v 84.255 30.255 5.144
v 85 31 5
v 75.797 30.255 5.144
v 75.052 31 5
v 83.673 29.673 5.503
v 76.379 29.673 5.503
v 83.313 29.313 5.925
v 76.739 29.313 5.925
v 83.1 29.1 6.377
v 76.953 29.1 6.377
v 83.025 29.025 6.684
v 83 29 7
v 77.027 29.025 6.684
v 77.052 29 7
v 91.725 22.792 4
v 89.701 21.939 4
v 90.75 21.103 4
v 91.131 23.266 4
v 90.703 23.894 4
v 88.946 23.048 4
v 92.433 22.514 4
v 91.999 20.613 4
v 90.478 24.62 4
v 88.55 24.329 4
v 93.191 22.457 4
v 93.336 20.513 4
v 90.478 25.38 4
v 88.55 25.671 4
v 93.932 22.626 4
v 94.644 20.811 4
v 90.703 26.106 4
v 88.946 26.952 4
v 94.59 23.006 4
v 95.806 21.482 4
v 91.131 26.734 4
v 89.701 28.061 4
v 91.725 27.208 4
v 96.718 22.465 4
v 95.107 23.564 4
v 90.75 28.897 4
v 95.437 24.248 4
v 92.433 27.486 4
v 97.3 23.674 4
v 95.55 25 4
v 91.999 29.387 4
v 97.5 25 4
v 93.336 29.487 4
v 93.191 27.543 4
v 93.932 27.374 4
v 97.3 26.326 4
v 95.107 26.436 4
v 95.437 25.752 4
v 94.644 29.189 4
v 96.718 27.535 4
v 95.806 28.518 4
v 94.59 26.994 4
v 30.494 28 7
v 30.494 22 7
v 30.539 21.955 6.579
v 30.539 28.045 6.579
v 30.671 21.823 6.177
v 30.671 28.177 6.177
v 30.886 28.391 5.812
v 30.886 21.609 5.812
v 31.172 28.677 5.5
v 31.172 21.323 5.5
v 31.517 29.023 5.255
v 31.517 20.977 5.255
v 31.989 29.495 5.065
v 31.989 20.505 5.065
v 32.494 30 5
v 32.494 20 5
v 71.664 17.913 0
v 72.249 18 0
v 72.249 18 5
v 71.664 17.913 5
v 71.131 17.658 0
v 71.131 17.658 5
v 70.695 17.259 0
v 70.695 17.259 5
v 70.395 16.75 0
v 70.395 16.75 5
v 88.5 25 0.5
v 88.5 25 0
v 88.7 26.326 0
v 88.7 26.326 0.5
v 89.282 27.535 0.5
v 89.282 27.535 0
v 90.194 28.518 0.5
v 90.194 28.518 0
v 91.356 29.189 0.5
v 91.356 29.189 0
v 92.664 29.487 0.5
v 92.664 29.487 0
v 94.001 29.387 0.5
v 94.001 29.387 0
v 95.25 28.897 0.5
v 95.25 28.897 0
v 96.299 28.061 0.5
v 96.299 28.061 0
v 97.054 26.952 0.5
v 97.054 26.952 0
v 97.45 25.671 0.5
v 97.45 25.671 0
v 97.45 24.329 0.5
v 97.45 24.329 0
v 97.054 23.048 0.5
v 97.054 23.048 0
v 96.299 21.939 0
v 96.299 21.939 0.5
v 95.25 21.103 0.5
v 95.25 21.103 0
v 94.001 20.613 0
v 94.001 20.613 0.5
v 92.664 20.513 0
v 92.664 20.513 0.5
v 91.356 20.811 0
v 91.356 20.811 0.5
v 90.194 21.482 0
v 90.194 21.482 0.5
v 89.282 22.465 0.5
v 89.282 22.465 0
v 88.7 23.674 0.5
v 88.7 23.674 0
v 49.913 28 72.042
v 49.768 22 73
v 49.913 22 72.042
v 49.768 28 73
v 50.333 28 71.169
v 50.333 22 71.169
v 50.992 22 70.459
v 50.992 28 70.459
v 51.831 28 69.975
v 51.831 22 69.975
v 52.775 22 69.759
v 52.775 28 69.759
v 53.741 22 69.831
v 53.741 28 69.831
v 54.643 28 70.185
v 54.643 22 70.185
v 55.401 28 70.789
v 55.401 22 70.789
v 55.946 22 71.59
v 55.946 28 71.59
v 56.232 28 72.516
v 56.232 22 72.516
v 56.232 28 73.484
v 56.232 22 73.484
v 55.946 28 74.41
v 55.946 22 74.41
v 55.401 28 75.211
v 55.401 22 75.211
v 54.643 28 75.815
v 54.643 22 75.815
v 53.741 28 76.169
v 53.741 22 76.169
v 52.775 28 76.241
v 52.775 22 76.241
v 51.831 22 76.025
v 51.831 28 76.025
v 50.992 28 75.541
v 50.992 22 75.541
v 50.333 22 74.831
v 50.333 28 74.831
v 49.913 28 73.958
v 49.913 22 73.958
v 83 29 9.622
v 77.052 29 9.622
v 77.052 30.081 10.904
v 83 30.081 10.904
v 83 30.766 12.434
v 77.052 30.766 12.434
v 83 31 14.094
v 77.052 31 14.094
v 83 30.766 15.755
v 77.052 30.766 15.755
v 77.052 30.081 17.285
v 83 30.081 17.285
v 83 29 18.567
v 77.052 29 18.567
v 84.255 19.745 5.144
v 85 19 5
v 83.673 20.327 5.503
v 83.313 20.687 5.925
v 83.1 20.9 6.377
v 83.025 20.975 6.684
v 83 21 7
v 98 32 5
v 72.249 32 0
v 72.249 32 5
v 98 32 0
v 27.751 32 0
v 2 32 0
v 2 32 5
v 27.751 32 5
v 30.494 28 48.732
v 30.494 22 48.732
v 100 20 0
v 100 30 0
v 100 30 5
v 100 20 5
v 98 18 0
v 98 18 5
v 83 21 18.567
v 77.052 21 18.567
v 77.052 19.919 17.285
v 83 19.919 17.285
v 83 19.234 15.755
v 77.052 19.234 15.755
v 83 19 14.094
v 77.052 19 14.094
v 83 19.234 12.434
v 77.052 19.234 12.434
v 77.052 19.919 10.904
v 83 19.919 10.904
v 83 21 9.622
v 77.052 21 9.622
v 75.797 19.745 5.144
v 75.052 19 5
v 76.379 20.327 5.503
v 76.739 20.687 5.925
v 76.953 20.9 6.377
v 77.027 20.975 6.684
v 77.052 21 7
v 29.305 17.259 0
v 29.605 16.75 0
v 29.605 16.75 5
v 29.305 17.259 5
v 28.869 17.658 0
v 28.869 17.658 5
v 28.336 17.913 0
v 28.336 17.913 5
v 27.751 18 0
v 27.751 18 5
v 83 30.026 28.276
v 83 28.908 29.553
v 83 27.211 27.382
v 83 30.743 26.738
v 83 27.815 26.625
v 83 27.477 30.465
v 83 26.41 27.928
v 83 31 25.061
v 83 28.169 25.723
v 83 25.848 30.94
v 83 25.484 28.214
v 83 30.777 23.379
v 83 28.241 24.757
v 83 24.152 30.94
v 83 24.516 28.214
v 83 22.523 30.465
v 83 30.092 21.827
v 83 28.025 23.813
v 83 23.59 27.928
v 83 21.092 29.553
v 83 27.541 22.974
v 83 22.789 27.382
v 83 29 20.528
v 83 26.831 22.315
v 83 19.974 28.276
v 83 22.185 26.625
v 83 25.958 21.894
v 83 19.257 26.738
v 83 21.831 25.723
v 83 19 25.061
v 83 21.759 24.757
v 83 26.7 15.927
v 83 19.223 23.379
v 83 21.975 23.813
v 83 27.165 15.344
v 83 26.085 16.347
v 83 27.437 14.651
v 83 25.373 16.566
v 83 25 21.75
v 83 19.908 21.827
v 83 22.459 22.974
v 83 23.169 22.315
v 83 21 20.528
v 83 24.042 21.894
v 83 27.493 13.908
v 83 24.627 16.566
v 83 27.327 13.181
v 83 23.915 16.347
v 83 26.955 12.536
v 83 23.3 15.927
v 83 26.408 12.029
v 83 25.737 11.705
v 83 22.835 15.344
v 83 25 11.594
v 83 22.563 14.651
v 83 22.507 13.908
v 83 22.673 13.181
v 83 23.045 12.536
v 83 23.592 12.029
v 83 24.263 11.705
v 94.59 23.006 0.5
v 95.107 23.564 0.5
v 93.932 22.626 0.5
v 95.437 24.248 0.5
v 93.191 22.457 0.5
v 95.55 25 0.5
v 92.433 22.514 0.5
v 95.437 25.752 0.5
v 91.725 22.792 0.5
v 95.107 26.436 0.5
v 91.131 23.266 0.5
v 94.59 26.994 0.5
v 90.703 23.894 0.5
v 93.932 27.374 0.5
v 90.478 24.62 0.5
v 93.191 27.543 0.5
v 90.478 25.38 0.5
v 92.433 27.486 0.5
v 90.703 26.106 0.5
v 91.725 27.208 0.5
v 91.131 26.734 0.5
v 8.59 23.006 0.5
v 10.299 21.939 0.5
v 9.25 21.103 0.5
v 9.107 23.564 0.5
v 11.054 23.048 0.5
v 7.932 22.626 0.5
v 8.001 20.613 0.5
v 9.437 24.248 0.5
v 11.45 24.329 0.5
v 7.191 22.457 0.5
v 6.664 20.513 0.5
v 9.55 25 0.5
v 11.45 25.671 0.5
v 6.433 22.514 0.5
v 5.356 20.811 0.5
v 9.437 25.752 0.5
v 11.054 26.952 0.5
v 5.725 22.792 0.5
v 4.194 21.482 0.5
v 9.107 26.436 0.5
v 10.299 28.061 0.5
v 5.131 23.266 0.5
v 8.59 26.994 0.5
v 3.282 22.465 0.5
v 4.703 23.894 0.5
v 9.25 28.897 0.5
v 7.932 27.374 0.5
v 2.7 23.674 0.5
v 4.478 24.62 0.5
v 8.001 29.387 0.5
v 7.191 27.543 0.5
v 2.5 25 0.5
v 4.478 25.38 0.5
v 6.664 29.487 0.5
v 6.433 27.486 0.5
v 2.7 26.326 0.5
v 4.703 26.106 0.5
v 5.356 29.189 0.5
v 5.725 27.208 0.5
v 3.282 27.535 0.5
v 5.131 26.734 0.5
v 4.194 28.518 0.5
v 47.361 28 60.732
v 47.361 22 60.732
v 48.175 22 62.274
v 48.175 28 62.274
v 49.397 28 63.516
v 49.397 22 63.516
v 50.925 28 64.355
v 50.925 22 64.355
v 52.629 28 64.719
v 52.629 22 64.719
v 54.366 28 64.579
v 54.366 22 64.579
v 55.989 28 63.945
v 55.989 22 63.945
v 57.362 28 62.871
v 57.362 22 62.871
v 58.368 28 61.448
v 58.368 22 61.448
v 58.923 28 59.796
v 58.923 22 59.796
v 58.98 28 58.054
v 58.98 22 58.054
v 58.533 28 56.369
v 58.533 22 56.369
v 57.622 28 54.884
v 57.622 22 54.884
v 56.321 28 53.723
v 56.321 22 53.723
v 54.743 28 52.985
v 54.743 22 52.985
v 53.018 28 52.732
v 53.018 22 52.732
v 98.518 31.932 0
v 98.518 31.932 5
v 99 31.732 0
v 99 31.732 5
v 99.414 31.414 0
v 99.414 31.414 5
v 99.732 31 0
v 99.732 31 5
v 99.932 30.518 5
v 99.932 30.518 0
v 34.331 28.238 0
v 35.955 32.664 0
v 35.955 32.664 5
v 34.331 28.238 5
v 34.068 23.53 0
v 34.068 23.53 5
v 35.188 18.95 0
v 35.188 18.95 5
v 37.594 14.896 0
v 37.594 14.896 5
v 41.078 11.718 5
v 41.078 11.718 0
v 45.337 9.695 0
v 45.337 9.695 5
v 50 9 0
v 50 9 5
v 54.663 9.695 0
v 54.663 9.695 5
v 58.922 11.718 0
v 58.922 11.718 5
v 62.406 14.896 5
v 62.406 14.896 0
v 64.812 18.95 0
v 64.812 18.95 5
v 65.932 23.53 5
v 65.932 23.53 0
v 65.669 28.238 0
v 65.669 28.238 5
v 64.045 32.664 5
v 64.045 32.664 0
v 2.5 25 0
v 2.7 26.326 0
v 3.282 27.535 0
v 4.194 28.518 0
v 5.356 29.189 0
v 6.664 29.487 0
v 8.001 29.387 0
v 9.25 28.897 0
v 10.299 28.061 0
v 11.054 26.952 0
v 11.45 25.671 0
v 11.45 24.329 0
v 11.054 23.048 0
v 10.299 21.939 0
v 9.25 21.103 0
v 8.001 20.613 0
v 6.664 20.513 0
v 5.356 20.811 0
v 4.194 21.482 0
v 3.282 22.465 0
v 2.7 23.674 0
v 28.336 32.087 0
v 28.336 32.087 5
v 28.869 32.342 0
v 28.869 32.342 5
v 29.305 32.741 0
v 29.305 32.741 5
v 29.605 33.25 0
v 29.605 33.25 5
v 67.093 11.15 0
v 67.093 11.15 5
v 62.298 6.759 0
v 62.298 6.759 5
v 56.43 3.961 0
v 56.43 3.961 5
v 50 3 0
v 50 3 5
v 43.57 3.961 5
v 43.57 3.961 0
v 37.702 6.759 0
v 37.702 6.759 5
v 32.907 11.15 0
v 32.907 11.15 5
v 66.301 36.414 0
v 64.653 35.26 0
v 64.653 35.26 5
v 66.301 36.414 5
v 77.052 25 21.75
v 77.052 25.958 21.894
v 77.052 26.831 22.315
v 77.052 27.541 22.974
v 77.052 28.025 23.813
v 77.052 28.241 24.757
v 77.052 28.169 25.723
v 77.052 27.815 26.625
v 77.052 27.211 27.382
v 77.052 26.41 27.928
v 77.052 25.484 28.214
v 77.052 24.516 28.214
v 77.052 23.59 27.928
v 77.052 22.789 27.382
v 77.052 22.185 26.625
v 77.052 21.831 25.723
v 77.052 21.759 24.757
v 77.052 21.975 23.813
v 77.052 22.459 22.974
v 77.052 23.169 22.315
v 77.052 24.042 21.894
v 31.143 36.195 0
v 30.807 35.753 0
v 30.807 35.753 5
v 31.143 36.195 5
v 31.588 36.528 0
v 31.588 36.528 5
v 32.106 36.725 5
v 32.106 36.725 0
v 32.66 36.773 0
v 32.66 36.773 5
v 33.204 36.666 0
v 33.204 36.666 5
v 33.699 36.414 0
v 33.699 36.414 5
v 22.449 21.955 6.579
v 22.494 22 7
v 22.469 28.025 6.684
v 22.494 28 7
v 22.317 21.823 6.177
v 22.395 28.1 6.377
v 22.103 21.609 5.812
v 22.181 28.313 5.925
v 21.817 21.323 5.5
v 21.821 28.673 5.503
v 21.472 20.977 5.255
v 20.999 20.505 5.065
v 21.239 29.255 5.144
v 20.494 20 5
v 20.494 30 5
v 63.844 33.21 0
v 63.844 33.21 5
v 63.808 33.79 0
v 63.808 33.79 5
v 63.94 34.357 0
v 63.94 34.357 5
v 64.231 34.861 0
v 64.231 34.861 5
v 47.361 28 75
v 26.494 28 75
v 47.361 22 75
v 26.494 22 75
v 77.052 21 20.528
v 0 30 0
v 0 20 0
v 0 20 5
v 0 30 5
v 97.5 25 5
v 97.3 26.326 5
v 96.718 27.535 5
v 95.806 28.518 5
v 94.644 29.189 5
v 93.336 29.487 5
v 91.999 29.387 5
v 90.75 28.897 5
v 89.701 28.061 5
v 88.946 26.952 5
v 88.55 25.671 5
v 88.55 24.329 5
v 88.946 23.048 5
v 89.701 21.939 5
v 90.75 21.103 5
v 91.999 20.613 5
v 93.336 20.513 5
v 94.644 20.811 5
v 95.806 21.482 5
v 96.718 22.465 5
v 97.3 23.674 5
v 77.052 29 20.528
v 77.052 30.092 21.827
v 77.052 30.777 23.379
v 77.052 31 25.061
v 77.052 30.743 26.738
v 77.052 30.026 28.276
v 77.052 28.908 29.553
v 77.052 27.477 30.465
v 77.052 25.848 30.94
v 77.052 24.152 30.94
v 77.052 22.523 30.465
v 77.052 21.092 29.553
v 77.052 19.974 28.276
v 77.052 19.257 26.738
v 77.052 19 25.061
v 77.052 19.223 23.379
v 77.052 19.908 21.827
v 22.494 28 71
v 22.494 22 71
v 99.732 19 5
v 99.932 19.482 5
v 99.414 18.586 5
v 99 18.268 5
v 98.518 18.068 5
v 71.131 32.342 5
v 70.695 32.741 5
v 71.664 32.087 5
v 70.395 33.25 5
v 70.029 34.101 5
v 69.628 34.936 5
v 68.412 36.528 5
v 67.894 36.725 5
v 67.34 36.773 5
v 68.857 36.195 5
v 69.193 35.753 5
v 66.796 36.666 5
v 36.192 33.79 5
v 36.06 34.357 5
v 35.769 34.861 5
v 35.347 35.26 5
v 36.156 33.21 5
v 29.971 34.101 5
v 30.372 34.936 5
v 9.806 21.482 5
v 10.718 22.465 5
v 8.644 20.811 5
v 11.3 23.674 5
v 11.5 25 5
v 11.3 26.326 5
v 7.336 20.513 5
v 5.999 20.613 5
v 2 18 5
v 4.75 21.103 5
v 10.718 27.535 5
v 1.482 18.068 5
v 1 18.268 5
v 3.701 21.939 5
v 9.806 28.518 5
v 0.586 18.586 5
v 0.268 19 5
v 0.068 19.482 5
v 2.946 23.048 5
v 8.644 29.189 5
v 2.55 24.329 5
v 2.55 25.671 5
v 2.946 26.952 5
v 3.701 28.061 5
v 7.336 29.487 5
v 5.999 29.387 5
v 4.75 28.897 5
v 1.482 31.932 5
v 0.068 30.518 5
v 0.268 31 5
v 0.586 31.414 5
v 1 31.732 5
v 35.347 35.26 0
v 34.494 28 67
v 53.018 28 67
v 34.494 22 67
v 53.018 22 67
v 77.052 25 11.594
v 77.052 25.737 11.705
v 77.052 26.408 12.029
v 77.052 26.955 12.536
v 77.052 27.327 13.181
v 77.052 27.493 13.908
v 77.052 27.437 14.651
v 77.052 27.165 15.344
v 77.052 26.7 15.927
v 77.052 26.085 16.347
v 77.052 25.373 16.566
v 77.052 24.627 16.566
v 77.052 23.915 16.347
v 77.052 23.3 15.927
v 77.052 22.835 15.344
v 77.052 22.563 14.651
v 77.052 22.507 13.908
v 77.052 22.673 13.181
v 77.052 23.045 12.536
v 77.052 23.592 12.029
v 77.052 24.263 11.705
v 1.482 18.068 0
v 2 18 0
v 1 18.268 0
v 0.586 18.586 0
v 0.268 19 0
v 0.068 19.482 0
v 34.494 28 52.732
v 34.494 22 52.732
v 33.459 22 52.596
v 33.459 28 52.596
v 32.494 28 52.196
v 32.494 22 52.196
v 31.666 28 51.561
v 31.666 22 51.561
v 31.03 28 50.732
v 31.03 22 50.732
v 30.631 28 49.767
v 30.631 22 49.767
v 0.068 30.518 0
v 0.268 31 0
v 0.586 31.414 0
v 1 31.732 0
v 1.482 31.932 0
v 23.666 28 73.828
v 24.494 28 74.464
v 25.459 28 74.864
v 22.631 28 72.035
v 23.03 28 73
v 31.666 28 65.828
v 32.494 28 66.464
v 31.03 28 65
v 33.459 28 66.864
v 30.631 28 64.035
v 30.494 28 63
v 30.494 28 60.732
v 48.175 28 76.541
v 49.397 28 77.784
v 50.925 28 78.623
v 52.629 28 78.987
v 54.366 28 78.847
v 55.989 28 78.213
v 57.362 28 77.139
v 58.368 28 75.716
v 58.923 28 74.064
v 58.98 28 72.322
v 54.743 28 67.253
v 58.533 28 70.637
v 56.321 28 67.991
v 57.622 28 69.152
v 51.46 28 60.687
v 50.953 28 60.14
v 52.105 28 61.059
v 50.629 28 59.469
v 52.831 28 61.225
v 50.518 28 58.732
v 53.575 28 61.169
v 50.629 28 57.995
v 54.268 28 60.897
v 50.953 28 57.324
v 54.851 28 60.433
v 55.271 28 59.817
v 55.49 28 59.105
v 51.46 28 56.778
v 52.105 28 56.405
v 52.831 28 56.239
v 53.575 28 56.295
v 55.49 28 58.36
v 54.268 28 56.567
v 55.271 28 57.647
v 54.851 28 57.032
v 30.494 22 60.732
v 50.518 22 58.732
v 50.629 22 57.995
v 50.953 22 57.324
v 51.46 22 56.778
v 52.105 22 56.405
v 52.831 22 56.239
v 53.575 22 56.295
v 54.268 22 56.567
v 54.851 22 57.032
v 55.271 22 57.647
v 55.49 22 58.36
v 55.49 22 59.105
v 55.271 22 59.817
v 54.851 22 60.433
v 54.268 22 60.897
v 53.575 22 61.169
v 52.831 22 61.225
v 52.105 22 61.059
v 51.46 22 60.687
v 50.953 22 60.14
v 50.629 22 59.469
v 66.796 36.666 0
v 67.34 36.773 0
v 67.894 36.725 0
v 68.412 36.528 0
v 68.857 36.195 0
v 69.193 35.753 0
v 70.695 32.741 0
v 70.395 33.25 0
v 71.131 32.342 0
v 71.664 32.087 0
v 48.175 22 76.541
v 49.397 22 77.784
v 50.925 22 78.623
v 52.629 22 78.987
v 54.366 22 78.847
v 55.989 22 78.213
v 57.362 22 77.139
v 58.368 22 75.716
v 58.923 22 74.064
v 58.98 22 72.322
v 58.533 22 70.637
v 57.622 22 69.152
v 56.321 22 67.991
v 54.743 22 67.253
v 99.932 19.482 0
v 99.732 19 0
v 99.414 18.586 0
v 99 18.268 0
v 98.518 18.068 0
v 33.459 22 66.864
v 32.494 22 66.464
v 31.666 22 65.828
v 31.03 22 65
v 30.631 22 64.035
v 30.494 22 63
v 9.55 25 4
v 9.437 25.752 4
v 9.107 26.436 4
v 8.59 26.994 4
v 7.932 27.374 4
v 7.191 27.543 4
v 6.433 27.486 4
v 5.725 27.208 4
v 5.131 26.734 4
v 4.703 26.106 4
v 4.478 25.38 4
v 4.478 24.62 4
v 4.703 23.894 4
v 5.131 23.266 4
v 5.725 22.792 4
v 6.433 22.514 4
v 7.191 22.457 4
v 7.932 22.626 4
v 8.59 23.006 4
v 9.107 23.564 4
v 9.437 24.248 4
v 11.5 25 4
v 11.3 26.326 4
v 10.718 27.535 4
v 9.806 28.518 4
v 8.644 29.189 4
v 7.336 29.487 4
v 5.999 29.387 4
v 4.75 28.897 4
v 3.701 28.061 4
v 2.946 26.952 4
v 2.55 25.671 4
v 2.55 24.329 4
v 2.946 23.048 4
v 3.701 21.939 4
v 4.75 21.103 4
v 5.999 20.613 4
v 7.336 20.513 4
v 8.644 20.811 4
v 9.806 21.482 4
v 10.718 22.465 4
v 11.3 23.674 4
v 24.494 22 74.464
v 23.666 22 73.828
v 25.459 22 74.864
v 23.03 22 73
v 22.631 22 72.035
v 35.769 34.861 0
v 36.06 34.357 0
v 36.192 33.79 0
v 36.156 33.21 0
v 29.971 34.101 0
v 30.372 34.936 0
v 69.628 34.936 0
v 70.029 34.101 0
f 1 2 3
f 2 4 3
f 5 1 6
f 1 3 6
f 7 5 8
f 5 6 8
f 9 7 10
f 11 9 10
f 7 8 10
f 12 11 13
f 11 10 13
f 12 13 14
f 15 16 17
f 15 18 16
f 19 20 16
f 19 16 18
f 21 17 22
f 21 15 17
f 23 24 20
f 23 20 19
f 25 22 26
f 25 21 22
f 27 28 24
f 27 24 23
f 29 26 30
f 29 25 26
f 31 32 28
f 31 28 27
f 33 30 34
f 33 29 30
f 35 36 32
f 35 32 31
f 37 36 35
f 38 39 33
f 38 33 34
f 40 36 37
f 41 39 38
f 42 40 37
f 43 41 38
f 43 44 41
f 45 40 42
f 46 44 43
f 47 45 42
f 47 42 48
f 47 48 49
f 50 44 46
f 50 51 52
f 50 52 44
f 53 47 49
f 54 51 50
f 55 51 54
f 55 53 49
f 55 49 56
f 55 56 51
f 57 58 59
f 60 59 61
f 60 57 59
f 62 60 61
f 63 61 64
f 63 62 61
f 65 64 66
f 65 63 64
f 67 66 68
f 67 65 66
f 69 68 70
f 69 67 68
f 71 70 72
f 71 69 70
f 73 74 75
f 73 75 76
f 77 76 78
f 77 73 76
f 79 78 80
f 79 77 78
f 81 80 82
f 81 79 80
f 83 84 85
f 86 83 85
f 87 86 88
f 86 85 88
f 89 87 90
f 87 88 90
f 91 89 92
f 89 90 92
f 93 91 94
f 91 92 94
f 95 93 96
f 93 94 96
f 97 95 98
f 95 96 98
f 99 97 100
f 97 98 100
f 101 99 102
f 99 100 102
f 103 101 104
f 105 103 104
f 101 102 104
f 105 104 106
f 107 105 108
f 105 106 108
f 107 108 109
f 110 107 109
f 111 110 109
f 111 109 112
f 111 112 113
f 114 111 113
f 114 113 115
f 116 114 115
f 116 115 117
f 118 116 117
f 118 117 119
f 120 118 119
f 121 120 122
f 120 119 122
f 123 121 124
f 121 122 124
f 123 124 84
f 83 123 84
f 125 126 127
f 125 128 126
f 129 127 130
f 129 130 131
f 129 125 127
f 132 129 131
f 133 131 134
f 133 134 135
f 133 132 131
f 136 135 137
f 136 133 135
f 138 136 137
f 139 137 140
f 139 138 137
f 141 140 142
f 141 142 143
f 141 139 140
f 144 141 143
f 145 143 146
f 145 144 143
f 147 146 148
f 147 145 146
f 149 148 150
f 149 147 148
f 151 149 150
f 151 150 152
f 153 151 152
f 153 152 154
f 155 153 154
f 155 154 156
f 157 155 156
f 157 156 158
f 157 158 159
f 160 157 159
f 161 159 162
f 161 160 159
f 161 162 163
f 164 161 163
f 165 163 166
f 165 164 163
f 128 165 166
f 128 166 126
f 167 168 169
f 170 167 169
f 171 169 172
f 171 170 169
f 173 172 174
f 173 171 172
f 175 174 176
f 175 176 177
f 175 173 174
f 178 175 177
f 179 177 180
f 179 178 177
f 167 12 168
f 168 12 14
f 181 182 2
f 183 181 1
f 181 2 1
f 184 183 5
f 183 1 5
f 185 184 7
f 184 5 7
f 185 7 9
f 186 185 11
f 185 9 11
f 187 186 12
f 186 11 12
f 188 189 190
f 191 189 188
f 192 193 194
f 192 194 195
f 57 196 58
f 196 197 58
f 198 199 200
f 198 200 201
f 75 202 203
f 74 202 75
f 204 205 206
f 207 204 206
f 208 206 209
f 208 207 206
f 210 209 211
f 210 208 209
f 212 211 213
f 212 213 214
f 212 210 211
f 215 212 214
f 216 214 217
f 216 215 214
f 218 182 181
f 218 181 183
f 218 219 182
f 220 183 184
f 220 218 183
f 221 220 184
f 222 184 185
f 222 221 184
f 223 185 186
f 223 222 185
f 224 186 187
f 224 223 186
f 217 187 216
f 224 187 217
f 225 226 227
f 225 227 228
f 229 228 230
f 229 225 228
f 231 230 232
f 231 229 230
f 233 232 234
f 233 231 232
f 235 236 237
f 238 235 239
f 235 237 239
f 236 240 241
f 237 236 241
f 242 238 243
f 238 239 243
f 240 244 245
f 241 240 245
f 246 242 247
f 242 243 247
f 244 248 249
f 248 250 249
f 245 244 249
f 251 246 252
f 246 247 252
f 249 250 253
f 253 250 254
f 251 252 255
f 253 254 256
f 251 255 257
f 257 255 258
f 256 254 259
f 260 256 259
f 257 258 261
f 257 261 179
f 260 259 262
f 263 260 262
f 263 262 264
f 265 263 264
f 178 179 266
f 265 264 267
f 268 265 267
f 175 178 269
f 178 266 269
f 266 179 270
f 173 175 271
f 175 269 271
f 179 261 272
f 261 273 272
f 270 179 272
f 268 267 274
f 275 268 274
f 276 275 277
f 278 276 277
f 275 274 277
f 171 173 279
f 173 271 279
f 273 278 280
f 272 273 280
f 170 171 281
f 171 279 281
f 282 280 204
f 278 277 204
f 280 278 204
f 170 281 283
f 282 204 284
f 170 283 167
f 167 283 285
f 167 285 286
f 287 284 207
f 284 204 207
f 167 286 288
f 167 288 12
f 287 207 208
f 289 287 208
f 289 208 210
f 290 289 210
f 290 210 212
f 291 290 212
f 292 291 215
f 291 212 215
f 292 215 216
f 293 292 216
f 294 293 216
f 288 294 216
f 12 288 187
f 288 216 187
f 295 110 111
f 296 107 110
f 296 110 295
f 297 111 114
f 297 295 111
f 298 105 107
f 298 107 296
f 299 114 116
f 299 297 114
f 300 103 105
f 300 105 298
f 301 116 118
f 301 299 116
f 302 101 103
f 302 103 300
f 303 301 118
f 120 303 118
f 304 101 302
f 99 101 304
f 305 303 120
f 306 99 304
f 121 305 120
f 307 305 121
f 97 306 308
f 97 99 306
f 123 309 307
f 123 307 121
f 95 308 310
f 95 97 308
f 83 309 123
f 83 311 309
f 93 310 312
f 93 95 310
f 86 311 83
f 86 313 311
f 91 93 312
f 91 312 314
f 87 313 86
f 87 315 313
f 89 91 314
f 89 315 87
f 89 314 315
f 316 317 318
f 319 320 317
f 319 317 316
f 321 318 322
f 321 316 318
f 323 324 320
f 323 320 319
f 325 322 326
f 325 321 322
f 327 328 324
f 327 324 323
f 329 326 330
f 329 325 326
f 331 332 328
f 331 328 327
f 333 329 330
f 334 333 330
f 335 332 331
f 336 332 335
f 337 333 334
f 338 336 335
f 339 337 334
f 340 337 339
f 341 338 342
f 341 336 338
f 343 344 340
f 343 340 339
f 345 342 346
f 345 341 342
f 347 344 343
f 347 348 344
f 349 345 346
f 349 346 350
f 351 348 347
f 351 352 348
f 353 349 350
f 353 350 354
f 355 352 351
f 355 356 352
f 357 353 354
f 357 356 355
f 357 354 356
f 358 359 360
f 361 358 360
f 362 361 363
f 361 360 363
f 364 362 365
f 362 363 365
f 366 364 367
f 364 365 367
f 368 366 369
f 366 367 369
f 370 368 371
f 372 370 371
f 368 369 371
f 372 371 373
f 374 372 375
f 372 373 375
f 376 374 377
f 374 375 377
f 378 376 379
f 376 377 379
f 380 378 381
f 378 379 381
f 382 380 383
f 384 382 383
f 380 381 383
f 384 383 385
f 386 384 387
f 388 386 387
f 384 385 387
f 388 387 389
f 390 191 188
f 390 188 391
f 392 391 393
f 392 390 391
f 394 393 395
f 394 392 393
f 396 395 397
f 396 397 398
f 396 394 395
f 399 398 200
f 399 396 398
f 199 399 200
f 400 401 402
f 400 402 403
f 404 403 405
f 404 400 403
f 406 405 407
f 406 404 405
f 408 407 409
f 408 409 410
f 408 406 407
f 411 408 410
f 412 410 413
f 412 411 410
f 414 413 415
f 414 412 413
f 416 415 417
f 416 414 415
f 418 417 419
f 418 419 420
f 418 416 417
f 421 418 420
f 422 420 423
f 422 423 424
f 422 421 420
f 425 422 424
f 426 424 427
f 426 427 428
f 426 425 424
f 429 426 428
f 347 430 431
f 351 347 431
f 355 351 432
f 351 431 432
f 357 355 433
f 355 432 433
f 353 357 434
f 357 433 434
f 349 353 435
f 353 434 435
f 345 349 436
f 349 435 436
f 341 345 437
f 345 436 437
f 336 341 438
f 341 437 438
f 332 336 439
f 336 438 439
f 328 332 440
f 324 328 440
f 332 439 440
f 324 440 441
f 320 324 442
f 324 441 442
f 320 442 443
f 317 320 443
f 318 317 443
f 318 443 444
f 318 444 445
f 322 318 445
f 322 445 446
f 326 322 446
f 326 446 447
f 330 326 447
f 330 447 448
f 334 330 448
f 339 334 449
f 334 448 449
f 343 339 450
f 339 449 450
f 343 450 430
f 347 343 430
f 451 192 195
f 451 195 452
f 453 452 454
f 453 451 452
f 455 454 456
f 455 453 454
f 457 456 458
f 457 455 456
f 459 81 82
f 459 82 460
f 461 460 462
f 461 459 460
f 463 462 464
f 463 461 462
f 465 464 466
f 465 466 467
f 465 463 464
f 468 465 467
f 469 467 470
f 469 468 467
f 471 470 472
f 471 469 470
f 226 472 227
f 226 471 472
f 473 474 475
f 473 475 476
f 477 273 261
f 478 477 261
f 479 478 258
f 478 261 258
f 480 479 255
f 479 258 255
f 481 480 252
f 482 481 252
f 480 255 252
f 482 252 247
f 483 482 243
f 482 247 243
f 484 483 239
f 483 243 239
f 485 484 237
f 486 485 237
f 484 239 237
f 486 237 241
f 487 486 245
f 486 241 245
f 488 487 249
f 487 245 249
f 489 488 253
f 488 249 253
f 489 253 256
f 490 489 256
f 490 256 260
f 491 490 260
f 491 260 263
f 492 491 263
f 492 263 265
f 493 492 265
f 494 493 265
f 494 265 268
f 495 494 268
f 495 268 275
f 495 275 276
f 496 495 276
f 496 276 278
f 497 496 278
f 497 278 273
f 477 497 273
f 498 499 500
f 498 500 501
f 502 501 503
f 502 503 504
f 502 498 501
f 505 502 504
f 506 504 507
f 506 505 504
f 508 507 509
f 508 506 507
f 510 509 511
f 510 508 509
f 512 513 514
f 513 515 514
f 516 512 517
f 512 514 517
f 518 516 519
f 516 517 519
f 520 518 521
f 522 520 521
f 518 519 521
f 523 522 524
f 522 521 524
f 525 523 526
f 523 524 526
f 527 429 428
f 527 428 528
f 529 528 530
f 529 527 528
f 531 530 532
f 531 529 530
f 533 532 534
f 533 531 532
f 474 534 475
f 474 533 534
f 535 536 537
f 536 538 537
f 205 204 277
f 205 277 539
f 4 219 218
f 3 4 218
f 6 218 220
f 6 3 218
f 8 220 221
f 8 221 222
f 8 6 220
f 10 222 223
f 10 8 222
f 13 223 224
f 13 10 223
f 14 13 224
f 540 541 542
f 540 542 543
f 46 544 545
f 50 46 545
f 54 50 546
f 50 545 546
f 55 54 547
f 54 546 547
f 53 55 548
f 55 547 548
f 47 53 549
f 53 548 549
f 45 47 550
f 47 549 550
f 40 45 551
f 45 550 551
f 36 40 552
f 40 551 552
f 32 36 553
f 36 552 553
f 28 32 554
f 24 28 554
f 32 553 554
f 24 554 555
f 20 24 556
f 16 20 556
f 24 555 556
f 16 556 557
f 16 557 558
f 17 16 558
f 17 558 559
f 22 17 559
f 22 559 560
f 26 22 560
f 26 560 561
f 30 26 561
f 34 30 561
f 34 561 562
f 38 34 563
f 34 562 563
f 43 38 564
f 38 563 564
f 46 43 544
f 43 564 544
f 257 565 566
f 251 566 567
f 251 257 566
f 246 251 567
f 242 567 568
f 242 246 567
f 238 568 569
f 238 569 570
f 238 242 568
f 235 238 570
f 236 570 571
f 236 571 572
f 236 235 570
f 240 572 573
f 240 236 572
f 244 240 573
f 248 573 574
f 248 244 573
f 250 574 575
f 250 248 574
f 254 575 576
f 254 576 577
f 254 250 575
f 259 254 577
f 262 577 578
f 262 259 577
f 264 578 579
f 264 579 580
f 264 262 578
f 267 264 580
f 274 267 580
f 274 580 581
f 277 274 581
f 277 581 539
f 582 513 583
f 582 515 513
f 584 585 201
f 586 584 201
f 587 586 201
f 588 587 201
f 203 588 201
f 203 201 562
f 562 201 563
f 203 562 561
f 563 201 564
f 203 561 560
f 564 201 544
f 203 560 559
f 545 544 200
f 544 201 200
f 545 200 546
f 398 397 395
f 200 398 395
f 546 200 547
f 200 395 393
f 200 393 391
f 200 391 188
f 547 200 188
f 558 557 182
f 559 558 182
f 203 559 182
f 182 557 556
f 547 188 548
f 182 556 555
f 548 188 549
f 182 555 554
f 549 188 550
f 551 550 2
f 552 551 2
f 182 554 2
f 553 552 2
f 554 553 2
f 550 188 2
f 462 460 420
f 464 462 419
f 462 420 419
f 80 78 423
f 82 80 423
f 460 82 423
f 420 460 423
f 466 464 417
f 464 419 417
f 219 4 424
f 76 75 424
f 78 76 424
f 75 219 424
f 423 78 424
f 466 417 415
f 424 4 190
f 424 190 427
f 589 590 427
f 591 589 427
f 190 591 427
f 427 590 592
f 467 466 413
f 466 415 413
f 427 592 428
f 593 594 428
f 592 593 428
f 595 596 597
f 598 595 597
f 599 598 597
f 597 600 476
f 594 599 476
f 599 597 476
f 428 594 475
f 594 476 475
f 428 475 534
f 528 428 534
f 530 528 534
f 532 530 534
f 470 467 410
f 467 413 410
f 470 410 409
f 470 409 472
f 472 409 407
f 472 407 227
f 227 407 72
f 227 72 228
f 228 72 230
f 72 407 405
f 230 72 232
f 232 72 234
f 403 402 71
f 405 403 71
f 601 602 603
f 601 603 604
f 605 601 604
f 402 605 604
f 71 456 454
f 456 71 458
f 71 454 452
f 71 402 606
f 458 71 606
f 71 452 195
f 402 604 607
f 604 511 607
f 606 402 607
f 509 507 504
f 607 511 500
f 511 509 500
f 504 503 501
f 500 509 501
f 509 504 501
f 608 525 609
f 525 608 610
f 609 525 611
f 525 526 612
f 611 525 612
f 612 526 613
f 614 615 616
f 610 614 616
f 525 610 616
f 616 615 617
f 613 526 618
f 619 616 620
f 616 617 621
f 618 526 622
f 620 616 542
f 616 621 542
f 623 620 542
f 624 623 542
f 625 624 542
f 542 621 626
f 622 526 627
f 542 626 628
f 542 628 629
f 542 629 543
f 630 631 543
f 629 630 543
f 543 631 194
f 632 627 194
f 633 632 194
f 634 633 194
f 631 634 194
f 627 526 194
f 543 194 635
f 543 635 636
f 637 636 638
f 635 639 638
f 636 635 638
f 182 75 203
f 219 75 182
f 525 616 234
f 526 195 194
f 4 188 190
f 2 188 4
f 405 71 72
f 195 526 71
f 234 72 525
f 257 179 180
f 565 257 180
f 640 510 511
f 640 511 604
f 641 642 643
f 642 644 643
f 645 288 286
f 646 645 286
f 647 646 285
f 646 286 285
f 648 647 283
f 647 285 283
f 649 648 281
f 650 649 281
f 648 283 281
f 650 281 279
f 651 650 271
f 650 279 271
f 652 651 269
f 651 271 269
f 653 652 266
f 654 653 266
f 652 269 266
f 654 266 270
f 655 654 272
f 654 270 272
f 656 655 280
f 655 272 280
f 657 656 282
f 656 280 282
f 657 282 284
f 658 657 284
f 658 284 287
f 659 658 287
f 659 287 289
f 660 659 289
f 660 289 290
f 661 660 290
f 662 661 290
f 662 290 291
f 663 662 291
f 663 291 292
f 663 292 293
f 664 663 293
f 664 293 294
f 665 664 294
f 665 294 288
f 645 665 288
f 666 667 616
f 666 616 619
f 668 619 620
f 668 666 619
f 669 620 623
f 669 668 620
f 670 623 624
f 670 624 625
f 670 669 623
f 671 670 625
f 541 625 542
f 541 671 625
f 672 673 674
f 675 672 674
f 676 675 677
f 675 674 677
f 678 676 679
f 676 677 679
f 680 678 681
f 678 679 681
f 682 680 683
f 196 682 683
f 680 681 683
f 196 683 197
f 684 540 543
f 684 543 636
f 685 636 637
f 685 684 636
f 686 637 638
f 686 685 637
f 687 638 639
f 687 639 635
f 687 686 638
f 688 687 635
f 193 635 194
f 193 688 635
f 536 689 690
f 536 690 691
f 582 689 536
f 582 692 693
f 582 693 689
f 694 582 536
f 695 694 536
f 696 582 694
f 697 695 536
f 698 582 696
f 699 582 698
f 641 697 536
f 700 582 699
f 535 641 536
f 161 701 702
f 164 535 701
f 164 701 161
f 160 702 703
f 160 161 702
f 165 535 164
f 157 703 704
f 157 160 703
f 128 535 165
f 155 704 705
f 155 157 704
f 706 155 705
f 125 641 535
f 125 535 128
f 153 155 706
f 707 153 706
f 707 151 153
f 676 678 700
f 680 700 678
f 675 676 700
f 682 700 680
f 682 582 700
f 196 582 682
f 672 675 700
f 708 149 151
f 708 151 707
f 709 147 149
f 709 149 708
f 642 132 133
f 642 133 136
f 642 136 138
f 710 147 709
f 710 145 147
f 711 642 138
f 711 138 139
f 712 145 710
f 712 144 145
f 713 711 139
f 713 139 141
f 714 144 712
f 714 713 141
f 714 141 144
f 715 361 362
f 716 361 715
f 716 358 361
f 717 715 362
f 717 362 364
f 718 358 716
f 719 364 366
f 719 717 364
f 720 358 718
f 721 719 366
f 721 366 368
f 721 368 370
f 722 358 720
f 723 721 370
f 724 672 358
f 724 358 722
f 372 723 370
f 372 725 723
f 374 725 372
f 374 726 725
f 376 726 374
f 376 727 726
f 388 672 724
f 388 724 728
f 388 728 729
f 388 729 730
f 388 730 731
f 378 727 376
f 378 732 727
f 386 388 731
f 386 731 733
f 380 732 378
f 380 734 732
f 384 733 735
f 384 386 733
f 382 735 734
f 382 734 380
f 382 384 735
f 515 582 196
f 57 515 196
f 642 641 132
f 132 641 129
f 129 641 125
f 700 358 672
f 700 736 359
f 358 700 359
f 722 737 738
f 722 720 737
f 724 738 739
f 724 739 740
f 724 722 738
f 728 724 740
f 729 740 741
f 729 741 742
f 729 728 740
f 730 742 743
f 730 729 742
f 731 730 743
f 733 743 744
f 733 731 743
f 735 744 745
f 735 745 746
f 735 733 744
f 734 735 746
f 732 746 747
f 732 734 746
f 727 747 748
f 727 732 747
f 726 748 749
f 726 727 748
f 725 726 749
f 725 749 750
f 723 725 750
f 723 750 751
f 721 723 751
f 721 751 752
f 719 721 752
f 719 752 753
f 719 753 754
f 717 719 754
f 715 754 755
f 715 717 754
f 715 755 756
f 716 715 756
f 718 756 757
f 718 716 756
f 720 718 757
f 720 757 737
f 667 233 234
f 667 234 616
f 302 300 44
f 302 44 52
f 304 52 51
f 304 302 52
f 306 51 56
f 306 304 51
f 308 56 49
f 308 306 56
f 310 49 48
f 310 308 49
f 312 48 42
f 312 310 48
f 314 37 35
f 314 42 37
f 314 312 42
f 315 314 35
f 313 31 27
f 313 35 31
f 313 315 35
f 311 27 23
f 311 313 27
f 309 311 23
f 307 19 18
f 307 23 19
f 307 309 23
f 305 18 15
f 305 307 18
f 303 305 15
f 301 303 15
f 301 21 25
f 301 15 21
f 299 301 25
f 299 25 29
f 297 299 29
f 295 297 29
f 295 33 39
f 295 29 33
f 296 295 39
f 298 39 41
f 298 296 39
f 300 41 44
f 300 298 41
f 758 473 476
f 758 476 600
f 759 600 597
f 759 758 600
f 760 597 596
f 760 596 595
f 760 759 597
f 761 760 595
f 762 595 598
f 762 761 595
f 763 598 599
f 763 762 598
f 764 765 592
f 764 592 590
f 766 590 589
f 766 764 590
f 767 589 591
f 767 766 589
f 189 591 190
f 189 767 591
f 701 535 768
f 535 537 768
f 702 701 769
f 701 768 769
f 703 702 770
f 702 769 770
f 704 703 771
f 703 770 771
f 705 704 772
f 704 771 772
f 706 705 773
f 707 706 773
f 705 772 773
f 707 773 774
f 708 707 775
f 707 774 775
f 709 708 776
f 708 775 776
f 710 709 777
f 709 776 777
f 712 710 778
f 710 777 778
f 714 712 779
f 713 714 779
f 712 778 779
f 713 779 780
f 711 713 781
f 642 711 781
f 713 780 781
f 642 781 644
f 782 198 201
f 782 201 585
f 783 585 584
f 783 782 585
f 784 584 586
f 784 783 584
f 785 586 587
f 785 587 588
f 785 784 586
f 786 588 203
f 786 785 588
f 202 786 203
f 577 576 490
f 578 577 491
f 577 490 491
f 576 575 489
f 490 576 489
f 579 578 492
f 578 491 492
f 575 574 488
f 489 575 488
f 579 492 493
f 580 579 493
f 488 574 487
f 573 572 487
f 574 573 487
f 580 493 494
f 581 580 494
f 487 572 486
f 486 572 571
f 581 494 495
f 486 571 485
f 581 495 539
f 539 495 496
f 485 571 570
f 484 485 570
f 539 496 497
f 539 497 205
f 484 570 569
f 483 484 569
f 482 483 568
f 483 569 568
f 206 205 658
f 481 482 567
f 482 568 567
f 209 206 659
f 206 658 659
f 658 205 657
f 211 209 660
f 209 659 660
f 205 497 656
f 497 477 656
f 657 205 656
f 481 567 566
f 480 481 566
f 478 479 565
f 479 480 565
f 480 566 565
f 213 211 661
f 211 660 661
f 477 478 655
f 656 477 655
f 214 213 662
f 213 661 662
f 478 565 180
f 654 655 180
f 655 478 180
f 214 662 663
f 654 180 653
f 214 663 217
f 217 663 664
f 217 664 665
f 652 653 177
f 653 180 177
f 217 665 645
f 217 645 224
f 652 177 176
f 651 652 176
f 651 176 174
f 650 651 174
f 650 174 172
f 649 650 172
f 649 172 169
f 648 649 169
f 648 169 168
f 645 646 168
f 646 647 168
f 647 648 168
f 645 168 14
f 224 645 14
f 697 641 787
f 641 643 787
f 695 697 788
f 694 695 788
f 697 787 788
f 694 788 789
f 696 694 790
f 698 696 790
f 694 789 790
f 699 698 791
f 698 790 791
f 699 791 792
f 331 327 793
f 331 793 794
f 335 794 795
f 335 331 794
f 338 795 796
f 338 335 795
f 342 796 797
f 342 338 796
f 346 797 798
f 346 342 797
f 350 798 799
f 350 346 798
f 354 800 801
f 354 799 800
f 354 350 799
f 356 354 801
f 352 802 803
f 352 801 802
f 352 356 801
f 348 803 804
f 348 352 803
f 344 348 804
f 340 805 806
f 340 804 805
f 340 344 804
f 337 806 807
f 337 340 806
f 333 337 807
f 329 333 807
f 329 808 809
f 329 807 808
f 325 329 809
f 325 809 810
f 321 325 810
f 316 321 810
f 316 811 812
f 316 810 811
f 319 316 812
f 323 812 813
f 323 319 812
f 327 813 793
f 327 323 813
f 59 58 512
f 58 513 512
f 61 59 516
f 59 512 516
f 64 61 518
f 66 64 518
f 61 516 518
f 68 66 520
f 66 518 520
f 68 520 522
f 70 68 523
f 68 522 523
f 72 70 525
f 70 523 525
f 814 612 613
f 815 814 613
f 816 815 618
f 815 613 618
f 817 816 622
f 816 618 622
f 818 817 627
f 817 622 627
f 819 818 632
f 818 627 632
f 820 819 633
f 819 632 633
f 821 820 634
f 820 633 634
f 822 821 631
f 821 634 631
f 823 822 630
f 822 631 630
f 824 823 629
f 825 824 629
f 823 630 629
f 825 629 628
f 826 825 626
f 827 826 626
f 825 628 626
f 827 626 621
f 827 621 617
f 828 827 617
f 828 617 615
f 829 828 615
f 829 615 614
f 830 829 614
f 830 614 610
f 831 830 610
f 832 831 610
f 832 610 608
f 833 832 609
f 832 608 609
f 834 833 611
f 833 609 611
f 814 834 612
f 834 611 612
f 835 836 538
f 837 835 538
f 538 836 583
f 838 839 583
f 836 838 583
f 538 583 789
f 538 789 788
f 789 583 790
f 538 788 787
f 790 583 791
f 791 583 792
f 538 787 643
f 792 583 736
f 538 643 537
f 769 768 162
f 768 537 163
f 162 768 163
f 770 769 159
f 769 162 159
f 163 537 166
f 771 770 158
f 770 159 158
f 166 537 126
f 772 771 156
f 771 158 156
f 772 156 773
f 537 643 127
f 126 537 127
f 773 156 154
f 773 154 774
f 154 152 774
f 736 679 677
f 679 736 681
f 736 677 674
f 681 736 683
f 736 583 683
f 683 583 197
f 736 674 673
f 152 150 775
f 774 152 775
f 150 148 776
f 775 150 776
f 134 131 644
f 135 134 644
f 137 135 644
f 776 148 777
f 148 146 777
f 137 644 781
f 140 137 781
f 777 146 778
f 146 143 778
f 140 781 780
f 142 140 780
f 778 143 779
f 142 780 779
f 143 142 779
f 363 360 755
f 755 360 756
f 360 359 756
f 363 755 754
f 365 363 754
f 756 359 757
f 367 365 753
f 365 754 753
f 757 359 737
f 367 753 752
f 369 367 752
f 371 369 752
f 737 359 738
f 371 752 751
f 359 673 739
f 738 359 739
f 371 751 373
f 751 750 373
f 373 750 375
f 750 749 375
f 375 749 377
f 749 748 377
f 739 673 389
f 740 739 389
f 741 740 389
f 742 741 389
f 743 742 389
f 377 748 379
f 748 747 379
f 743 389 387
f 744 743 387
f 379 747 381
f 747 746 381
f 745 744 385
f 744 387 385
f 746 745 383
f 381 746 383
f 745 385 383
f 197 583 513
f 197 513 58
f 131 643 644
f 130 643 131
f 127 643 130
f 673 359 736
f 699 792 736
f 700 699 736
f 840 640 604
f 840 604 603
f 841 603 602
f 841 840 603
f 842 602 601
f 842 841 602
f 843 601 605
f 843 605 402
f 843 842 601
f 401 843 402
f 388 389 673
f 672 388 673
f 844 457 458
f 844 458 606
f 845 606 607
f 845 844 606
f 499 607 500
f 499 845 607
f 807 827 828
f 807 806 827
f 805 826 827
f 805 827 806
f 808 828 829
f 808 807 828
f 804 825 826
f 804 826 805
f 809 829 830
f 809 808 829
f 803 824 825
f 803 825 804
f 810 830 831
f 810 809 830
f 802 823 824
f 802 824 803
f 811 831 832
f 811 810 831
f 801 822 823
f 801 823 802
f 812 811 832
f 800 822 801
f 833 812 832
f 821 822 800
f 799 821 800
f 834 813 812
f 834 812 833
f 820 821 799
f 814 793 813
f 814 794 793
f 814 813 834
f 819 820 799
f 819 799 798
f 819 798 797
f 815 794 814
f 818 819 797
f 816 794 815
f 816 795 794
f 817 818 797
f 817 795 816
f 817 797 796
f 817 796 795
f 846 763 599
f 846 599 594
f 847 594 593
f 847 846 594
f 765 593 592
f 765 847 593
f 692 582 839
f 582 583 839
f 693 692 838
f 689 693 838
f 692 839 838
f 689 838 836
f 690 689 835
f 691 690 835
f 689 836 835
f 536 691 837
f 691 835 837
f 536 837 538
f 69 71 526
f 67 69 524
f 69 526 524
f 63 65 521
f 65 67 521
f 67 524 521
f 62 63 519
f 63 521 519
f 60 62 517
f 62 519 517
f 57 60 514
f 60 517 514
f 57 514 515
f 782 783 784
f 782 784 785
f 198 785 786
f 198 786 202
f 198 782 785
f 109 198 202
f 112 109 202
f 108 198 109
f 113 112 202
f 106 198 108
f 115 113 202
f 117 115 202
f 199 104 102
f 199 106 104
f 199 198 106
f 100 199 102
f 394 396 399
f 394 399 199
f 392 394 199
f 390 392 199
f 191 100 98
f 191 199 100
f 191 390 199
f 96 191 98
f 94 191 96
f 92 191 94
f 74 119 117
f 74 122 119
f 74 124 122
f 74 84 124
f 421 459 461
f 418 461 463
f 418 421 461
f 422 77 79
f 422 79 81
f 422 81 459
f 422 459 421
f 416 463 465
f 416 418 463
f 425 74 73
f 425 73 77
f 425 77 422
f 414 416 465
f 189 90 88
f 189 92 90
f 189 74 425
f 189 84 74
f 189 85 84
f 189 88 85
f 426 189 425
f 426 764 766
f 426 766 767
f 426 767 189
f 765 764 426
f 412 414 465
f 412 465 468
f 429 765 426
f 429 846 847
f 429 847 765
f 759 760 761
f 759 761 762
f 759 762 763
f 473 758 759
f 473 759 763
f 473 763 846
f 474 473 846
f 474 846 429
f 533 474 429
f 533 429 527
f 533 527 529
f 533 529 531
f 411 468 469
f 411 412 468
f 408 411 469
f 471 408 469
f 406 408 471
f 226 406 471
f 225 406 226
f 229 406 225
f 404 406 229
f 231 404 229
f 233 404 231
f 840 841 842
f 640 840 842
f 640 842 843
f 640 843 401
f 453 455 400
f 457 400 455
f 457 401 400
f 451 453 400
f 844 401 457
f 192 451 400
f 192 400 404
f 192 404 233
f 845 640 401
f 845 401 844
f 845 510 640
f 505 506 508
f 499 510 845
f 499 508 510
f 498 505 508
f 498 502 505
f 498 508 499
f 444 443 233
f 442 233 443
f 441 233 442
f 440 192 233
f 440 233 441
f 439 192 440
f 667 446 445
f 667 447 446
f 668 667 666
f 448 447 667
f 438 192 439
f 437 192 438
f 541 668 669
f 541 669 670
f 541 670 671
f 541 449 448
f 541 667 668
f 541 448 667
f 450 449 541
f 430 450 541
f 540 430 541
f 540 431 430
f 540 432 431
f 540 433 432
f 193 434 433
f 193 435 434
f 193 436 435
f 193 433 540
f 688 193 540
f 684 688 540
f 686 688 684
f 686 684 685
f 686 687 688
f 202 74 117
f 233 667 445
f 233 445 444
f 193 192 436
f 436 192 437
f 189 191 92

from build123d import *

# Parameters (mm, degrees)
SKETCH1_R                = 2.55
BOSS_EXTRUDE1_DEPTH      = 5
SKETCH4_R                = 4.5
CUT_EXTRUDE2_DEPTH       = 1
SKETCH6_W                = 5.947651005
SKETCH6_H                = 20
BOSS_EXTRUDE2_DEPTH      = 4
BOSS_EXTRUDE2_DEPTH_BACK = 4
SKETCH11_R               = 4.5
CUT_EXTRUDE3_DEPTH       = 0.5
SKETCH16_R               = 3.25
SKETCH16_R_2             = 2.5
BOSS_EXTRUDE3_DEPTH      = 3
BOSS_EXTRUDE3_DEPTH_BACK = 3
FILLET3_R                = 2
BOSS_EXTRUDE4_DEPTH      = 5.947651
CUT_EXTRUDE5_REACH       = 85
SKETCH18_R               = 3.25
SKETCH18_R_2             = 2.5


with BuildPart() as part:
    # Sketch1 → Boss-Extrude1 (new body)
    with BuildSketch(Plane.XY):
        with BuildLine():
            Line((100, 25), (100, 20))
            ThreePointArc((100, 20), (99.414213562, 18.585786438), (98, 18))
            Line((98, 18), (72.248595461, 18))
            ThreePointArc((72.248595461, 18), (71.130561473, 17.658312395), (70.39454584, 16.75))
            ThreePointArc((70.39454584, 16.75), (50, 3), (29.60545416, 16.75))
            ThreePointArc((29.60545416, 16.75), (28.869438527, 17.658312395), (27.751404539, 18))
            Line((27.751404539, 18), (2, 18))
            ThreePointArc((2, 18), (0.585786438, 18.585786438), (0, 20))
            Line((0, 20), (0, 25))
            Line((0, 25), (0, 30))
            ThreePointArc((0, 30), (0.585786438, 31.414213562), (2, 32))
            Line((2, 32), (21.056240945, 32))
            Line((21.056240945, 32), (27.751404539, 32))
            ThreePointArc((27.751404539, 32), (28.869438527, 32.341687605), (29.60545416, 33.25))
            ThreePointArc((29.60545416, 33.25), (30.166752838, 34.520625347), (30.807119991, 35.753295167))
            ThreePointArc((30.807119991, 35.753295167), (32.106461975, 36.725482012), (33.699080137, 36.414026968))
            Line((33.699080137, 36.414026968), (35.34656276, 35.260447216))
            ThreePointArc((35.34656276, 35.260447216), (36.146649881, 34.078494315), (35.955031011, 32.664127224))
            ThreePointArc((35.955031011, 32.664127224), (50, 9), (64.044968989, 32.664127224))
            ThreePointArc((64.044968989, 32.664127224), (63.853350119, 34.078494315), (64.65343724, 35.260447216))
            Line((64.65343724, 35.260447216), (66.300919863, 36.414026968))
            ThreePointArc((66.300919863, 36.414026968), (67.893538025, 36.725482012), (69.192880009, 35.753295167))
            ThreePointArc((69.192880009, 35.753295167), (69.833247162, 34.520625347), (70.39454584, 33.25))
            ThreePointArc((70.39454584, 33.25), (71.130561473, 32.341687605), (72.248595461, 32))
            Line((72.248595461, 32), (78.943759055, 32))
            Line((78.943759055, 32), (98, 32))
            ThreePointArc((98, 32), (99.414213562, 31.414213562), (100, 30))
            Line((100, 30), (100, 25))
        make_face()
        with Locations((93, 25)):
            Circle(SKETCH1_R, mode=Mode.SUBTRACT)
        with Locations((7, 25)):
            Circle(SKETCH1_R, mode=Mode.SUBTRACT)
    extrude(amount=BOSS_EXTRUDE1_DEPTH)

    # Sketch4 → Cut-Extrude2 (cut)
    with BuildSketch(Plane.XY.offset(5)):
        with Locations((93, 25)):
            Circle(SKETCH4_R)
        with Locations((7, 25)):
            Circle(SKETCH4_R)
    extrude(amount=-CUT_EXTRUDE2_DEPTH, mode=Mode.SUBTRACT)

    # Sketch6 → Boss-Extrude2 (add, two sides)
    with BuildSketch(Plane(origin=(0, 25, 0), x_dir=(-1, 0, 0), z_dir=(0, -1, 0))) as boss_extrude2_sk:
        with Locations((-80.026174497, -15)):
            Rectangle(SKETCH6_W, SKETCH6_H)
    extrude(amount=BOSS_EXTRUDE2_DEPTH)
    extrude(boss_extrude2_sk.sketch, amount=-BOSS_EXTRUDE2_DEPTH_BACK)

    # Sketch11 → Cut-Extrude3 (cut)
    with BuildSketch(Plane(origin=(0, 0, 0), x_dir=(-1, 0, 0), z_dir=(0, 0, -1))):
        with Locations((-93, 25)):
            Circle(SKETCH11_R)
        with Locations((-7, 25)):
            Circle(SKETCH11_R)
    extrude(amount=-CUT_EXTRUDE3_DEPTH, mode=Mode.SUBTRACT)

    # Sketch16 → Boss-Extrude3 (add, two sides)
    with BuildSketch(Plane(origin=(0, 25, 0), x_dir=(-1, 0, 0), z_dir=(0, -1, 0))) as boss_extrude3_sk:
        with BuildLine():
            Line((-30.494270905, -5), (-22.494270905, -5))
            Line((-22.494270905, -5), (-22.494270905, -71))
            ThreePointArc((-22.494270905, -71), (-23.665843781, -73.828427125), (-26.494270905, -75))
            Line((-26.494270905, -75), (-30.494270905, -75))
            Line((-30.494270905, -75), (-47.361403242, -75))
            ThreePointArc((-47.361403242, -75), (-57.917236977, -76.464101615), (-53.018257491, -67))
            Line((-53.018257491, -67), (-34.494270905, -67))
            ThreePointArc((-34.494270905, -67), (-31.665843781, -65.828427125), (-30.494270905, -63))
            Line((-30.494270905, -63), (-30.494270905, -60.732138804))
            Line((-30.494270905, -60.732138804), (-47.361403242, -60.732138804))
            ThreePointArc((-47.361403242, -60.732138804), (-57.917236977, -62.196240419), (-53.018257491, -52.732138804))
            Line((-53.018257491, -52.732138804), (-34.494270905, -52.732138804))
            ThreePointArc((-34.494270905, -52.732138804), (-31.665843781, -51.560565928), (-30.494270905, -48.732138804))
            Line((-30.494270905, -48.732138804), (-30.494270905, -5))
        make_face()
        with Locations((-53.018257491, -73)):
            Circle(SKETCH16_R, mode=Mode.SUBTRACT)
        with Locations((-53.018257491, -58.732138804)):
            Circle(SKETCH16_R_2, mode=Mode.SUBTRACT)
    extrude(amount=BOSS_EXTRUDE3_DEPTH)
    extrude(boss_extrude3_sk.sketch, amount=-BOSS_EXTRUDE3_DEPTH_BACK)

    # Fillet3
    fillet3_edges = [part.edges().sort_by_distance(p)[0] for p in [
        (83, 25, 5),
        (80.026174498, 29, 5),
        (77.052348995, 25, 5),
        (80.026174498, 21, 5),
        (30.494270905, 25, 5),
        (26.494270905, 28, 5),
        (22.494270905, 25, 5),
        (26.494270905, 22, 5),
    ]]
    fillet(fillet3_edges, radius=FILLET3_R)

    # Sketch17 → Boss-Extrude4 (add)
    with BuildSketch(Plane(origin=(83, 0, 0), x_dir=(0, 0, -1), z_dir=(1, 0, 0))):
        with BuildLine():
            ThreePointArc((-19.547210182, 27.503414308), (-31, 25), (-19.547210182, 22.496585692))
            ThreePointArc((-19.547210182, 22.496585692), (-8.094420363, 25), (-19.547210182, 27.503414308))
        make_face()
    extrude(amount=-BOSS_EXTRUDE4_DEPTH)

    # Sketch18 → Cut-Extrude5 (cut, up to next)
    with BuildSketch(Plane(origin=(83, 0, 0), x_dir=(0, 0, -1), z_dir=(1, 0, 0)), mode=Mode.PRIVATE) as cut_extrude5_sk1:
        with Locations((-25, 25)):
            Circle(SKETCH18_R)
    cut_extrude5_tool1 = extrude(cut_extrude5_sk1.sketch, amount=-CUT_EXTRUDE5_REACH, mode=Mode.PRIVATE) & part.part
    add(cut_extrude5_tool1.solids().sort_by_distance((83, 25, 25))[0], mode=Mode.SUBTRACT)
    # Sketch18 → Cut-Extrude5 (cut, up to next)
    with BuildSketch(Plane(origin=(83, 0, 0), x_dir=(0, 0, -1), z_dir=(1, 0, 0)), mode=Mode.PRIVATE) as cut_extrude5_sk2:
        with Locations((-14.094420363, 25)):
            Circle(SKETCH18_R_2)
    cut_extrude5_tool2 = extrude(cut_extrude5_sk2.sketch, amount=-CUT_EXTRUDE5_REACH, mode=Mode.PRIVATE) & part.part
    add(cut_extrude5_tool2.solids().sort_by_distance((83, 25, 14.09442))[0], mode=Mode.SUBTRACT)


solid = part.part
